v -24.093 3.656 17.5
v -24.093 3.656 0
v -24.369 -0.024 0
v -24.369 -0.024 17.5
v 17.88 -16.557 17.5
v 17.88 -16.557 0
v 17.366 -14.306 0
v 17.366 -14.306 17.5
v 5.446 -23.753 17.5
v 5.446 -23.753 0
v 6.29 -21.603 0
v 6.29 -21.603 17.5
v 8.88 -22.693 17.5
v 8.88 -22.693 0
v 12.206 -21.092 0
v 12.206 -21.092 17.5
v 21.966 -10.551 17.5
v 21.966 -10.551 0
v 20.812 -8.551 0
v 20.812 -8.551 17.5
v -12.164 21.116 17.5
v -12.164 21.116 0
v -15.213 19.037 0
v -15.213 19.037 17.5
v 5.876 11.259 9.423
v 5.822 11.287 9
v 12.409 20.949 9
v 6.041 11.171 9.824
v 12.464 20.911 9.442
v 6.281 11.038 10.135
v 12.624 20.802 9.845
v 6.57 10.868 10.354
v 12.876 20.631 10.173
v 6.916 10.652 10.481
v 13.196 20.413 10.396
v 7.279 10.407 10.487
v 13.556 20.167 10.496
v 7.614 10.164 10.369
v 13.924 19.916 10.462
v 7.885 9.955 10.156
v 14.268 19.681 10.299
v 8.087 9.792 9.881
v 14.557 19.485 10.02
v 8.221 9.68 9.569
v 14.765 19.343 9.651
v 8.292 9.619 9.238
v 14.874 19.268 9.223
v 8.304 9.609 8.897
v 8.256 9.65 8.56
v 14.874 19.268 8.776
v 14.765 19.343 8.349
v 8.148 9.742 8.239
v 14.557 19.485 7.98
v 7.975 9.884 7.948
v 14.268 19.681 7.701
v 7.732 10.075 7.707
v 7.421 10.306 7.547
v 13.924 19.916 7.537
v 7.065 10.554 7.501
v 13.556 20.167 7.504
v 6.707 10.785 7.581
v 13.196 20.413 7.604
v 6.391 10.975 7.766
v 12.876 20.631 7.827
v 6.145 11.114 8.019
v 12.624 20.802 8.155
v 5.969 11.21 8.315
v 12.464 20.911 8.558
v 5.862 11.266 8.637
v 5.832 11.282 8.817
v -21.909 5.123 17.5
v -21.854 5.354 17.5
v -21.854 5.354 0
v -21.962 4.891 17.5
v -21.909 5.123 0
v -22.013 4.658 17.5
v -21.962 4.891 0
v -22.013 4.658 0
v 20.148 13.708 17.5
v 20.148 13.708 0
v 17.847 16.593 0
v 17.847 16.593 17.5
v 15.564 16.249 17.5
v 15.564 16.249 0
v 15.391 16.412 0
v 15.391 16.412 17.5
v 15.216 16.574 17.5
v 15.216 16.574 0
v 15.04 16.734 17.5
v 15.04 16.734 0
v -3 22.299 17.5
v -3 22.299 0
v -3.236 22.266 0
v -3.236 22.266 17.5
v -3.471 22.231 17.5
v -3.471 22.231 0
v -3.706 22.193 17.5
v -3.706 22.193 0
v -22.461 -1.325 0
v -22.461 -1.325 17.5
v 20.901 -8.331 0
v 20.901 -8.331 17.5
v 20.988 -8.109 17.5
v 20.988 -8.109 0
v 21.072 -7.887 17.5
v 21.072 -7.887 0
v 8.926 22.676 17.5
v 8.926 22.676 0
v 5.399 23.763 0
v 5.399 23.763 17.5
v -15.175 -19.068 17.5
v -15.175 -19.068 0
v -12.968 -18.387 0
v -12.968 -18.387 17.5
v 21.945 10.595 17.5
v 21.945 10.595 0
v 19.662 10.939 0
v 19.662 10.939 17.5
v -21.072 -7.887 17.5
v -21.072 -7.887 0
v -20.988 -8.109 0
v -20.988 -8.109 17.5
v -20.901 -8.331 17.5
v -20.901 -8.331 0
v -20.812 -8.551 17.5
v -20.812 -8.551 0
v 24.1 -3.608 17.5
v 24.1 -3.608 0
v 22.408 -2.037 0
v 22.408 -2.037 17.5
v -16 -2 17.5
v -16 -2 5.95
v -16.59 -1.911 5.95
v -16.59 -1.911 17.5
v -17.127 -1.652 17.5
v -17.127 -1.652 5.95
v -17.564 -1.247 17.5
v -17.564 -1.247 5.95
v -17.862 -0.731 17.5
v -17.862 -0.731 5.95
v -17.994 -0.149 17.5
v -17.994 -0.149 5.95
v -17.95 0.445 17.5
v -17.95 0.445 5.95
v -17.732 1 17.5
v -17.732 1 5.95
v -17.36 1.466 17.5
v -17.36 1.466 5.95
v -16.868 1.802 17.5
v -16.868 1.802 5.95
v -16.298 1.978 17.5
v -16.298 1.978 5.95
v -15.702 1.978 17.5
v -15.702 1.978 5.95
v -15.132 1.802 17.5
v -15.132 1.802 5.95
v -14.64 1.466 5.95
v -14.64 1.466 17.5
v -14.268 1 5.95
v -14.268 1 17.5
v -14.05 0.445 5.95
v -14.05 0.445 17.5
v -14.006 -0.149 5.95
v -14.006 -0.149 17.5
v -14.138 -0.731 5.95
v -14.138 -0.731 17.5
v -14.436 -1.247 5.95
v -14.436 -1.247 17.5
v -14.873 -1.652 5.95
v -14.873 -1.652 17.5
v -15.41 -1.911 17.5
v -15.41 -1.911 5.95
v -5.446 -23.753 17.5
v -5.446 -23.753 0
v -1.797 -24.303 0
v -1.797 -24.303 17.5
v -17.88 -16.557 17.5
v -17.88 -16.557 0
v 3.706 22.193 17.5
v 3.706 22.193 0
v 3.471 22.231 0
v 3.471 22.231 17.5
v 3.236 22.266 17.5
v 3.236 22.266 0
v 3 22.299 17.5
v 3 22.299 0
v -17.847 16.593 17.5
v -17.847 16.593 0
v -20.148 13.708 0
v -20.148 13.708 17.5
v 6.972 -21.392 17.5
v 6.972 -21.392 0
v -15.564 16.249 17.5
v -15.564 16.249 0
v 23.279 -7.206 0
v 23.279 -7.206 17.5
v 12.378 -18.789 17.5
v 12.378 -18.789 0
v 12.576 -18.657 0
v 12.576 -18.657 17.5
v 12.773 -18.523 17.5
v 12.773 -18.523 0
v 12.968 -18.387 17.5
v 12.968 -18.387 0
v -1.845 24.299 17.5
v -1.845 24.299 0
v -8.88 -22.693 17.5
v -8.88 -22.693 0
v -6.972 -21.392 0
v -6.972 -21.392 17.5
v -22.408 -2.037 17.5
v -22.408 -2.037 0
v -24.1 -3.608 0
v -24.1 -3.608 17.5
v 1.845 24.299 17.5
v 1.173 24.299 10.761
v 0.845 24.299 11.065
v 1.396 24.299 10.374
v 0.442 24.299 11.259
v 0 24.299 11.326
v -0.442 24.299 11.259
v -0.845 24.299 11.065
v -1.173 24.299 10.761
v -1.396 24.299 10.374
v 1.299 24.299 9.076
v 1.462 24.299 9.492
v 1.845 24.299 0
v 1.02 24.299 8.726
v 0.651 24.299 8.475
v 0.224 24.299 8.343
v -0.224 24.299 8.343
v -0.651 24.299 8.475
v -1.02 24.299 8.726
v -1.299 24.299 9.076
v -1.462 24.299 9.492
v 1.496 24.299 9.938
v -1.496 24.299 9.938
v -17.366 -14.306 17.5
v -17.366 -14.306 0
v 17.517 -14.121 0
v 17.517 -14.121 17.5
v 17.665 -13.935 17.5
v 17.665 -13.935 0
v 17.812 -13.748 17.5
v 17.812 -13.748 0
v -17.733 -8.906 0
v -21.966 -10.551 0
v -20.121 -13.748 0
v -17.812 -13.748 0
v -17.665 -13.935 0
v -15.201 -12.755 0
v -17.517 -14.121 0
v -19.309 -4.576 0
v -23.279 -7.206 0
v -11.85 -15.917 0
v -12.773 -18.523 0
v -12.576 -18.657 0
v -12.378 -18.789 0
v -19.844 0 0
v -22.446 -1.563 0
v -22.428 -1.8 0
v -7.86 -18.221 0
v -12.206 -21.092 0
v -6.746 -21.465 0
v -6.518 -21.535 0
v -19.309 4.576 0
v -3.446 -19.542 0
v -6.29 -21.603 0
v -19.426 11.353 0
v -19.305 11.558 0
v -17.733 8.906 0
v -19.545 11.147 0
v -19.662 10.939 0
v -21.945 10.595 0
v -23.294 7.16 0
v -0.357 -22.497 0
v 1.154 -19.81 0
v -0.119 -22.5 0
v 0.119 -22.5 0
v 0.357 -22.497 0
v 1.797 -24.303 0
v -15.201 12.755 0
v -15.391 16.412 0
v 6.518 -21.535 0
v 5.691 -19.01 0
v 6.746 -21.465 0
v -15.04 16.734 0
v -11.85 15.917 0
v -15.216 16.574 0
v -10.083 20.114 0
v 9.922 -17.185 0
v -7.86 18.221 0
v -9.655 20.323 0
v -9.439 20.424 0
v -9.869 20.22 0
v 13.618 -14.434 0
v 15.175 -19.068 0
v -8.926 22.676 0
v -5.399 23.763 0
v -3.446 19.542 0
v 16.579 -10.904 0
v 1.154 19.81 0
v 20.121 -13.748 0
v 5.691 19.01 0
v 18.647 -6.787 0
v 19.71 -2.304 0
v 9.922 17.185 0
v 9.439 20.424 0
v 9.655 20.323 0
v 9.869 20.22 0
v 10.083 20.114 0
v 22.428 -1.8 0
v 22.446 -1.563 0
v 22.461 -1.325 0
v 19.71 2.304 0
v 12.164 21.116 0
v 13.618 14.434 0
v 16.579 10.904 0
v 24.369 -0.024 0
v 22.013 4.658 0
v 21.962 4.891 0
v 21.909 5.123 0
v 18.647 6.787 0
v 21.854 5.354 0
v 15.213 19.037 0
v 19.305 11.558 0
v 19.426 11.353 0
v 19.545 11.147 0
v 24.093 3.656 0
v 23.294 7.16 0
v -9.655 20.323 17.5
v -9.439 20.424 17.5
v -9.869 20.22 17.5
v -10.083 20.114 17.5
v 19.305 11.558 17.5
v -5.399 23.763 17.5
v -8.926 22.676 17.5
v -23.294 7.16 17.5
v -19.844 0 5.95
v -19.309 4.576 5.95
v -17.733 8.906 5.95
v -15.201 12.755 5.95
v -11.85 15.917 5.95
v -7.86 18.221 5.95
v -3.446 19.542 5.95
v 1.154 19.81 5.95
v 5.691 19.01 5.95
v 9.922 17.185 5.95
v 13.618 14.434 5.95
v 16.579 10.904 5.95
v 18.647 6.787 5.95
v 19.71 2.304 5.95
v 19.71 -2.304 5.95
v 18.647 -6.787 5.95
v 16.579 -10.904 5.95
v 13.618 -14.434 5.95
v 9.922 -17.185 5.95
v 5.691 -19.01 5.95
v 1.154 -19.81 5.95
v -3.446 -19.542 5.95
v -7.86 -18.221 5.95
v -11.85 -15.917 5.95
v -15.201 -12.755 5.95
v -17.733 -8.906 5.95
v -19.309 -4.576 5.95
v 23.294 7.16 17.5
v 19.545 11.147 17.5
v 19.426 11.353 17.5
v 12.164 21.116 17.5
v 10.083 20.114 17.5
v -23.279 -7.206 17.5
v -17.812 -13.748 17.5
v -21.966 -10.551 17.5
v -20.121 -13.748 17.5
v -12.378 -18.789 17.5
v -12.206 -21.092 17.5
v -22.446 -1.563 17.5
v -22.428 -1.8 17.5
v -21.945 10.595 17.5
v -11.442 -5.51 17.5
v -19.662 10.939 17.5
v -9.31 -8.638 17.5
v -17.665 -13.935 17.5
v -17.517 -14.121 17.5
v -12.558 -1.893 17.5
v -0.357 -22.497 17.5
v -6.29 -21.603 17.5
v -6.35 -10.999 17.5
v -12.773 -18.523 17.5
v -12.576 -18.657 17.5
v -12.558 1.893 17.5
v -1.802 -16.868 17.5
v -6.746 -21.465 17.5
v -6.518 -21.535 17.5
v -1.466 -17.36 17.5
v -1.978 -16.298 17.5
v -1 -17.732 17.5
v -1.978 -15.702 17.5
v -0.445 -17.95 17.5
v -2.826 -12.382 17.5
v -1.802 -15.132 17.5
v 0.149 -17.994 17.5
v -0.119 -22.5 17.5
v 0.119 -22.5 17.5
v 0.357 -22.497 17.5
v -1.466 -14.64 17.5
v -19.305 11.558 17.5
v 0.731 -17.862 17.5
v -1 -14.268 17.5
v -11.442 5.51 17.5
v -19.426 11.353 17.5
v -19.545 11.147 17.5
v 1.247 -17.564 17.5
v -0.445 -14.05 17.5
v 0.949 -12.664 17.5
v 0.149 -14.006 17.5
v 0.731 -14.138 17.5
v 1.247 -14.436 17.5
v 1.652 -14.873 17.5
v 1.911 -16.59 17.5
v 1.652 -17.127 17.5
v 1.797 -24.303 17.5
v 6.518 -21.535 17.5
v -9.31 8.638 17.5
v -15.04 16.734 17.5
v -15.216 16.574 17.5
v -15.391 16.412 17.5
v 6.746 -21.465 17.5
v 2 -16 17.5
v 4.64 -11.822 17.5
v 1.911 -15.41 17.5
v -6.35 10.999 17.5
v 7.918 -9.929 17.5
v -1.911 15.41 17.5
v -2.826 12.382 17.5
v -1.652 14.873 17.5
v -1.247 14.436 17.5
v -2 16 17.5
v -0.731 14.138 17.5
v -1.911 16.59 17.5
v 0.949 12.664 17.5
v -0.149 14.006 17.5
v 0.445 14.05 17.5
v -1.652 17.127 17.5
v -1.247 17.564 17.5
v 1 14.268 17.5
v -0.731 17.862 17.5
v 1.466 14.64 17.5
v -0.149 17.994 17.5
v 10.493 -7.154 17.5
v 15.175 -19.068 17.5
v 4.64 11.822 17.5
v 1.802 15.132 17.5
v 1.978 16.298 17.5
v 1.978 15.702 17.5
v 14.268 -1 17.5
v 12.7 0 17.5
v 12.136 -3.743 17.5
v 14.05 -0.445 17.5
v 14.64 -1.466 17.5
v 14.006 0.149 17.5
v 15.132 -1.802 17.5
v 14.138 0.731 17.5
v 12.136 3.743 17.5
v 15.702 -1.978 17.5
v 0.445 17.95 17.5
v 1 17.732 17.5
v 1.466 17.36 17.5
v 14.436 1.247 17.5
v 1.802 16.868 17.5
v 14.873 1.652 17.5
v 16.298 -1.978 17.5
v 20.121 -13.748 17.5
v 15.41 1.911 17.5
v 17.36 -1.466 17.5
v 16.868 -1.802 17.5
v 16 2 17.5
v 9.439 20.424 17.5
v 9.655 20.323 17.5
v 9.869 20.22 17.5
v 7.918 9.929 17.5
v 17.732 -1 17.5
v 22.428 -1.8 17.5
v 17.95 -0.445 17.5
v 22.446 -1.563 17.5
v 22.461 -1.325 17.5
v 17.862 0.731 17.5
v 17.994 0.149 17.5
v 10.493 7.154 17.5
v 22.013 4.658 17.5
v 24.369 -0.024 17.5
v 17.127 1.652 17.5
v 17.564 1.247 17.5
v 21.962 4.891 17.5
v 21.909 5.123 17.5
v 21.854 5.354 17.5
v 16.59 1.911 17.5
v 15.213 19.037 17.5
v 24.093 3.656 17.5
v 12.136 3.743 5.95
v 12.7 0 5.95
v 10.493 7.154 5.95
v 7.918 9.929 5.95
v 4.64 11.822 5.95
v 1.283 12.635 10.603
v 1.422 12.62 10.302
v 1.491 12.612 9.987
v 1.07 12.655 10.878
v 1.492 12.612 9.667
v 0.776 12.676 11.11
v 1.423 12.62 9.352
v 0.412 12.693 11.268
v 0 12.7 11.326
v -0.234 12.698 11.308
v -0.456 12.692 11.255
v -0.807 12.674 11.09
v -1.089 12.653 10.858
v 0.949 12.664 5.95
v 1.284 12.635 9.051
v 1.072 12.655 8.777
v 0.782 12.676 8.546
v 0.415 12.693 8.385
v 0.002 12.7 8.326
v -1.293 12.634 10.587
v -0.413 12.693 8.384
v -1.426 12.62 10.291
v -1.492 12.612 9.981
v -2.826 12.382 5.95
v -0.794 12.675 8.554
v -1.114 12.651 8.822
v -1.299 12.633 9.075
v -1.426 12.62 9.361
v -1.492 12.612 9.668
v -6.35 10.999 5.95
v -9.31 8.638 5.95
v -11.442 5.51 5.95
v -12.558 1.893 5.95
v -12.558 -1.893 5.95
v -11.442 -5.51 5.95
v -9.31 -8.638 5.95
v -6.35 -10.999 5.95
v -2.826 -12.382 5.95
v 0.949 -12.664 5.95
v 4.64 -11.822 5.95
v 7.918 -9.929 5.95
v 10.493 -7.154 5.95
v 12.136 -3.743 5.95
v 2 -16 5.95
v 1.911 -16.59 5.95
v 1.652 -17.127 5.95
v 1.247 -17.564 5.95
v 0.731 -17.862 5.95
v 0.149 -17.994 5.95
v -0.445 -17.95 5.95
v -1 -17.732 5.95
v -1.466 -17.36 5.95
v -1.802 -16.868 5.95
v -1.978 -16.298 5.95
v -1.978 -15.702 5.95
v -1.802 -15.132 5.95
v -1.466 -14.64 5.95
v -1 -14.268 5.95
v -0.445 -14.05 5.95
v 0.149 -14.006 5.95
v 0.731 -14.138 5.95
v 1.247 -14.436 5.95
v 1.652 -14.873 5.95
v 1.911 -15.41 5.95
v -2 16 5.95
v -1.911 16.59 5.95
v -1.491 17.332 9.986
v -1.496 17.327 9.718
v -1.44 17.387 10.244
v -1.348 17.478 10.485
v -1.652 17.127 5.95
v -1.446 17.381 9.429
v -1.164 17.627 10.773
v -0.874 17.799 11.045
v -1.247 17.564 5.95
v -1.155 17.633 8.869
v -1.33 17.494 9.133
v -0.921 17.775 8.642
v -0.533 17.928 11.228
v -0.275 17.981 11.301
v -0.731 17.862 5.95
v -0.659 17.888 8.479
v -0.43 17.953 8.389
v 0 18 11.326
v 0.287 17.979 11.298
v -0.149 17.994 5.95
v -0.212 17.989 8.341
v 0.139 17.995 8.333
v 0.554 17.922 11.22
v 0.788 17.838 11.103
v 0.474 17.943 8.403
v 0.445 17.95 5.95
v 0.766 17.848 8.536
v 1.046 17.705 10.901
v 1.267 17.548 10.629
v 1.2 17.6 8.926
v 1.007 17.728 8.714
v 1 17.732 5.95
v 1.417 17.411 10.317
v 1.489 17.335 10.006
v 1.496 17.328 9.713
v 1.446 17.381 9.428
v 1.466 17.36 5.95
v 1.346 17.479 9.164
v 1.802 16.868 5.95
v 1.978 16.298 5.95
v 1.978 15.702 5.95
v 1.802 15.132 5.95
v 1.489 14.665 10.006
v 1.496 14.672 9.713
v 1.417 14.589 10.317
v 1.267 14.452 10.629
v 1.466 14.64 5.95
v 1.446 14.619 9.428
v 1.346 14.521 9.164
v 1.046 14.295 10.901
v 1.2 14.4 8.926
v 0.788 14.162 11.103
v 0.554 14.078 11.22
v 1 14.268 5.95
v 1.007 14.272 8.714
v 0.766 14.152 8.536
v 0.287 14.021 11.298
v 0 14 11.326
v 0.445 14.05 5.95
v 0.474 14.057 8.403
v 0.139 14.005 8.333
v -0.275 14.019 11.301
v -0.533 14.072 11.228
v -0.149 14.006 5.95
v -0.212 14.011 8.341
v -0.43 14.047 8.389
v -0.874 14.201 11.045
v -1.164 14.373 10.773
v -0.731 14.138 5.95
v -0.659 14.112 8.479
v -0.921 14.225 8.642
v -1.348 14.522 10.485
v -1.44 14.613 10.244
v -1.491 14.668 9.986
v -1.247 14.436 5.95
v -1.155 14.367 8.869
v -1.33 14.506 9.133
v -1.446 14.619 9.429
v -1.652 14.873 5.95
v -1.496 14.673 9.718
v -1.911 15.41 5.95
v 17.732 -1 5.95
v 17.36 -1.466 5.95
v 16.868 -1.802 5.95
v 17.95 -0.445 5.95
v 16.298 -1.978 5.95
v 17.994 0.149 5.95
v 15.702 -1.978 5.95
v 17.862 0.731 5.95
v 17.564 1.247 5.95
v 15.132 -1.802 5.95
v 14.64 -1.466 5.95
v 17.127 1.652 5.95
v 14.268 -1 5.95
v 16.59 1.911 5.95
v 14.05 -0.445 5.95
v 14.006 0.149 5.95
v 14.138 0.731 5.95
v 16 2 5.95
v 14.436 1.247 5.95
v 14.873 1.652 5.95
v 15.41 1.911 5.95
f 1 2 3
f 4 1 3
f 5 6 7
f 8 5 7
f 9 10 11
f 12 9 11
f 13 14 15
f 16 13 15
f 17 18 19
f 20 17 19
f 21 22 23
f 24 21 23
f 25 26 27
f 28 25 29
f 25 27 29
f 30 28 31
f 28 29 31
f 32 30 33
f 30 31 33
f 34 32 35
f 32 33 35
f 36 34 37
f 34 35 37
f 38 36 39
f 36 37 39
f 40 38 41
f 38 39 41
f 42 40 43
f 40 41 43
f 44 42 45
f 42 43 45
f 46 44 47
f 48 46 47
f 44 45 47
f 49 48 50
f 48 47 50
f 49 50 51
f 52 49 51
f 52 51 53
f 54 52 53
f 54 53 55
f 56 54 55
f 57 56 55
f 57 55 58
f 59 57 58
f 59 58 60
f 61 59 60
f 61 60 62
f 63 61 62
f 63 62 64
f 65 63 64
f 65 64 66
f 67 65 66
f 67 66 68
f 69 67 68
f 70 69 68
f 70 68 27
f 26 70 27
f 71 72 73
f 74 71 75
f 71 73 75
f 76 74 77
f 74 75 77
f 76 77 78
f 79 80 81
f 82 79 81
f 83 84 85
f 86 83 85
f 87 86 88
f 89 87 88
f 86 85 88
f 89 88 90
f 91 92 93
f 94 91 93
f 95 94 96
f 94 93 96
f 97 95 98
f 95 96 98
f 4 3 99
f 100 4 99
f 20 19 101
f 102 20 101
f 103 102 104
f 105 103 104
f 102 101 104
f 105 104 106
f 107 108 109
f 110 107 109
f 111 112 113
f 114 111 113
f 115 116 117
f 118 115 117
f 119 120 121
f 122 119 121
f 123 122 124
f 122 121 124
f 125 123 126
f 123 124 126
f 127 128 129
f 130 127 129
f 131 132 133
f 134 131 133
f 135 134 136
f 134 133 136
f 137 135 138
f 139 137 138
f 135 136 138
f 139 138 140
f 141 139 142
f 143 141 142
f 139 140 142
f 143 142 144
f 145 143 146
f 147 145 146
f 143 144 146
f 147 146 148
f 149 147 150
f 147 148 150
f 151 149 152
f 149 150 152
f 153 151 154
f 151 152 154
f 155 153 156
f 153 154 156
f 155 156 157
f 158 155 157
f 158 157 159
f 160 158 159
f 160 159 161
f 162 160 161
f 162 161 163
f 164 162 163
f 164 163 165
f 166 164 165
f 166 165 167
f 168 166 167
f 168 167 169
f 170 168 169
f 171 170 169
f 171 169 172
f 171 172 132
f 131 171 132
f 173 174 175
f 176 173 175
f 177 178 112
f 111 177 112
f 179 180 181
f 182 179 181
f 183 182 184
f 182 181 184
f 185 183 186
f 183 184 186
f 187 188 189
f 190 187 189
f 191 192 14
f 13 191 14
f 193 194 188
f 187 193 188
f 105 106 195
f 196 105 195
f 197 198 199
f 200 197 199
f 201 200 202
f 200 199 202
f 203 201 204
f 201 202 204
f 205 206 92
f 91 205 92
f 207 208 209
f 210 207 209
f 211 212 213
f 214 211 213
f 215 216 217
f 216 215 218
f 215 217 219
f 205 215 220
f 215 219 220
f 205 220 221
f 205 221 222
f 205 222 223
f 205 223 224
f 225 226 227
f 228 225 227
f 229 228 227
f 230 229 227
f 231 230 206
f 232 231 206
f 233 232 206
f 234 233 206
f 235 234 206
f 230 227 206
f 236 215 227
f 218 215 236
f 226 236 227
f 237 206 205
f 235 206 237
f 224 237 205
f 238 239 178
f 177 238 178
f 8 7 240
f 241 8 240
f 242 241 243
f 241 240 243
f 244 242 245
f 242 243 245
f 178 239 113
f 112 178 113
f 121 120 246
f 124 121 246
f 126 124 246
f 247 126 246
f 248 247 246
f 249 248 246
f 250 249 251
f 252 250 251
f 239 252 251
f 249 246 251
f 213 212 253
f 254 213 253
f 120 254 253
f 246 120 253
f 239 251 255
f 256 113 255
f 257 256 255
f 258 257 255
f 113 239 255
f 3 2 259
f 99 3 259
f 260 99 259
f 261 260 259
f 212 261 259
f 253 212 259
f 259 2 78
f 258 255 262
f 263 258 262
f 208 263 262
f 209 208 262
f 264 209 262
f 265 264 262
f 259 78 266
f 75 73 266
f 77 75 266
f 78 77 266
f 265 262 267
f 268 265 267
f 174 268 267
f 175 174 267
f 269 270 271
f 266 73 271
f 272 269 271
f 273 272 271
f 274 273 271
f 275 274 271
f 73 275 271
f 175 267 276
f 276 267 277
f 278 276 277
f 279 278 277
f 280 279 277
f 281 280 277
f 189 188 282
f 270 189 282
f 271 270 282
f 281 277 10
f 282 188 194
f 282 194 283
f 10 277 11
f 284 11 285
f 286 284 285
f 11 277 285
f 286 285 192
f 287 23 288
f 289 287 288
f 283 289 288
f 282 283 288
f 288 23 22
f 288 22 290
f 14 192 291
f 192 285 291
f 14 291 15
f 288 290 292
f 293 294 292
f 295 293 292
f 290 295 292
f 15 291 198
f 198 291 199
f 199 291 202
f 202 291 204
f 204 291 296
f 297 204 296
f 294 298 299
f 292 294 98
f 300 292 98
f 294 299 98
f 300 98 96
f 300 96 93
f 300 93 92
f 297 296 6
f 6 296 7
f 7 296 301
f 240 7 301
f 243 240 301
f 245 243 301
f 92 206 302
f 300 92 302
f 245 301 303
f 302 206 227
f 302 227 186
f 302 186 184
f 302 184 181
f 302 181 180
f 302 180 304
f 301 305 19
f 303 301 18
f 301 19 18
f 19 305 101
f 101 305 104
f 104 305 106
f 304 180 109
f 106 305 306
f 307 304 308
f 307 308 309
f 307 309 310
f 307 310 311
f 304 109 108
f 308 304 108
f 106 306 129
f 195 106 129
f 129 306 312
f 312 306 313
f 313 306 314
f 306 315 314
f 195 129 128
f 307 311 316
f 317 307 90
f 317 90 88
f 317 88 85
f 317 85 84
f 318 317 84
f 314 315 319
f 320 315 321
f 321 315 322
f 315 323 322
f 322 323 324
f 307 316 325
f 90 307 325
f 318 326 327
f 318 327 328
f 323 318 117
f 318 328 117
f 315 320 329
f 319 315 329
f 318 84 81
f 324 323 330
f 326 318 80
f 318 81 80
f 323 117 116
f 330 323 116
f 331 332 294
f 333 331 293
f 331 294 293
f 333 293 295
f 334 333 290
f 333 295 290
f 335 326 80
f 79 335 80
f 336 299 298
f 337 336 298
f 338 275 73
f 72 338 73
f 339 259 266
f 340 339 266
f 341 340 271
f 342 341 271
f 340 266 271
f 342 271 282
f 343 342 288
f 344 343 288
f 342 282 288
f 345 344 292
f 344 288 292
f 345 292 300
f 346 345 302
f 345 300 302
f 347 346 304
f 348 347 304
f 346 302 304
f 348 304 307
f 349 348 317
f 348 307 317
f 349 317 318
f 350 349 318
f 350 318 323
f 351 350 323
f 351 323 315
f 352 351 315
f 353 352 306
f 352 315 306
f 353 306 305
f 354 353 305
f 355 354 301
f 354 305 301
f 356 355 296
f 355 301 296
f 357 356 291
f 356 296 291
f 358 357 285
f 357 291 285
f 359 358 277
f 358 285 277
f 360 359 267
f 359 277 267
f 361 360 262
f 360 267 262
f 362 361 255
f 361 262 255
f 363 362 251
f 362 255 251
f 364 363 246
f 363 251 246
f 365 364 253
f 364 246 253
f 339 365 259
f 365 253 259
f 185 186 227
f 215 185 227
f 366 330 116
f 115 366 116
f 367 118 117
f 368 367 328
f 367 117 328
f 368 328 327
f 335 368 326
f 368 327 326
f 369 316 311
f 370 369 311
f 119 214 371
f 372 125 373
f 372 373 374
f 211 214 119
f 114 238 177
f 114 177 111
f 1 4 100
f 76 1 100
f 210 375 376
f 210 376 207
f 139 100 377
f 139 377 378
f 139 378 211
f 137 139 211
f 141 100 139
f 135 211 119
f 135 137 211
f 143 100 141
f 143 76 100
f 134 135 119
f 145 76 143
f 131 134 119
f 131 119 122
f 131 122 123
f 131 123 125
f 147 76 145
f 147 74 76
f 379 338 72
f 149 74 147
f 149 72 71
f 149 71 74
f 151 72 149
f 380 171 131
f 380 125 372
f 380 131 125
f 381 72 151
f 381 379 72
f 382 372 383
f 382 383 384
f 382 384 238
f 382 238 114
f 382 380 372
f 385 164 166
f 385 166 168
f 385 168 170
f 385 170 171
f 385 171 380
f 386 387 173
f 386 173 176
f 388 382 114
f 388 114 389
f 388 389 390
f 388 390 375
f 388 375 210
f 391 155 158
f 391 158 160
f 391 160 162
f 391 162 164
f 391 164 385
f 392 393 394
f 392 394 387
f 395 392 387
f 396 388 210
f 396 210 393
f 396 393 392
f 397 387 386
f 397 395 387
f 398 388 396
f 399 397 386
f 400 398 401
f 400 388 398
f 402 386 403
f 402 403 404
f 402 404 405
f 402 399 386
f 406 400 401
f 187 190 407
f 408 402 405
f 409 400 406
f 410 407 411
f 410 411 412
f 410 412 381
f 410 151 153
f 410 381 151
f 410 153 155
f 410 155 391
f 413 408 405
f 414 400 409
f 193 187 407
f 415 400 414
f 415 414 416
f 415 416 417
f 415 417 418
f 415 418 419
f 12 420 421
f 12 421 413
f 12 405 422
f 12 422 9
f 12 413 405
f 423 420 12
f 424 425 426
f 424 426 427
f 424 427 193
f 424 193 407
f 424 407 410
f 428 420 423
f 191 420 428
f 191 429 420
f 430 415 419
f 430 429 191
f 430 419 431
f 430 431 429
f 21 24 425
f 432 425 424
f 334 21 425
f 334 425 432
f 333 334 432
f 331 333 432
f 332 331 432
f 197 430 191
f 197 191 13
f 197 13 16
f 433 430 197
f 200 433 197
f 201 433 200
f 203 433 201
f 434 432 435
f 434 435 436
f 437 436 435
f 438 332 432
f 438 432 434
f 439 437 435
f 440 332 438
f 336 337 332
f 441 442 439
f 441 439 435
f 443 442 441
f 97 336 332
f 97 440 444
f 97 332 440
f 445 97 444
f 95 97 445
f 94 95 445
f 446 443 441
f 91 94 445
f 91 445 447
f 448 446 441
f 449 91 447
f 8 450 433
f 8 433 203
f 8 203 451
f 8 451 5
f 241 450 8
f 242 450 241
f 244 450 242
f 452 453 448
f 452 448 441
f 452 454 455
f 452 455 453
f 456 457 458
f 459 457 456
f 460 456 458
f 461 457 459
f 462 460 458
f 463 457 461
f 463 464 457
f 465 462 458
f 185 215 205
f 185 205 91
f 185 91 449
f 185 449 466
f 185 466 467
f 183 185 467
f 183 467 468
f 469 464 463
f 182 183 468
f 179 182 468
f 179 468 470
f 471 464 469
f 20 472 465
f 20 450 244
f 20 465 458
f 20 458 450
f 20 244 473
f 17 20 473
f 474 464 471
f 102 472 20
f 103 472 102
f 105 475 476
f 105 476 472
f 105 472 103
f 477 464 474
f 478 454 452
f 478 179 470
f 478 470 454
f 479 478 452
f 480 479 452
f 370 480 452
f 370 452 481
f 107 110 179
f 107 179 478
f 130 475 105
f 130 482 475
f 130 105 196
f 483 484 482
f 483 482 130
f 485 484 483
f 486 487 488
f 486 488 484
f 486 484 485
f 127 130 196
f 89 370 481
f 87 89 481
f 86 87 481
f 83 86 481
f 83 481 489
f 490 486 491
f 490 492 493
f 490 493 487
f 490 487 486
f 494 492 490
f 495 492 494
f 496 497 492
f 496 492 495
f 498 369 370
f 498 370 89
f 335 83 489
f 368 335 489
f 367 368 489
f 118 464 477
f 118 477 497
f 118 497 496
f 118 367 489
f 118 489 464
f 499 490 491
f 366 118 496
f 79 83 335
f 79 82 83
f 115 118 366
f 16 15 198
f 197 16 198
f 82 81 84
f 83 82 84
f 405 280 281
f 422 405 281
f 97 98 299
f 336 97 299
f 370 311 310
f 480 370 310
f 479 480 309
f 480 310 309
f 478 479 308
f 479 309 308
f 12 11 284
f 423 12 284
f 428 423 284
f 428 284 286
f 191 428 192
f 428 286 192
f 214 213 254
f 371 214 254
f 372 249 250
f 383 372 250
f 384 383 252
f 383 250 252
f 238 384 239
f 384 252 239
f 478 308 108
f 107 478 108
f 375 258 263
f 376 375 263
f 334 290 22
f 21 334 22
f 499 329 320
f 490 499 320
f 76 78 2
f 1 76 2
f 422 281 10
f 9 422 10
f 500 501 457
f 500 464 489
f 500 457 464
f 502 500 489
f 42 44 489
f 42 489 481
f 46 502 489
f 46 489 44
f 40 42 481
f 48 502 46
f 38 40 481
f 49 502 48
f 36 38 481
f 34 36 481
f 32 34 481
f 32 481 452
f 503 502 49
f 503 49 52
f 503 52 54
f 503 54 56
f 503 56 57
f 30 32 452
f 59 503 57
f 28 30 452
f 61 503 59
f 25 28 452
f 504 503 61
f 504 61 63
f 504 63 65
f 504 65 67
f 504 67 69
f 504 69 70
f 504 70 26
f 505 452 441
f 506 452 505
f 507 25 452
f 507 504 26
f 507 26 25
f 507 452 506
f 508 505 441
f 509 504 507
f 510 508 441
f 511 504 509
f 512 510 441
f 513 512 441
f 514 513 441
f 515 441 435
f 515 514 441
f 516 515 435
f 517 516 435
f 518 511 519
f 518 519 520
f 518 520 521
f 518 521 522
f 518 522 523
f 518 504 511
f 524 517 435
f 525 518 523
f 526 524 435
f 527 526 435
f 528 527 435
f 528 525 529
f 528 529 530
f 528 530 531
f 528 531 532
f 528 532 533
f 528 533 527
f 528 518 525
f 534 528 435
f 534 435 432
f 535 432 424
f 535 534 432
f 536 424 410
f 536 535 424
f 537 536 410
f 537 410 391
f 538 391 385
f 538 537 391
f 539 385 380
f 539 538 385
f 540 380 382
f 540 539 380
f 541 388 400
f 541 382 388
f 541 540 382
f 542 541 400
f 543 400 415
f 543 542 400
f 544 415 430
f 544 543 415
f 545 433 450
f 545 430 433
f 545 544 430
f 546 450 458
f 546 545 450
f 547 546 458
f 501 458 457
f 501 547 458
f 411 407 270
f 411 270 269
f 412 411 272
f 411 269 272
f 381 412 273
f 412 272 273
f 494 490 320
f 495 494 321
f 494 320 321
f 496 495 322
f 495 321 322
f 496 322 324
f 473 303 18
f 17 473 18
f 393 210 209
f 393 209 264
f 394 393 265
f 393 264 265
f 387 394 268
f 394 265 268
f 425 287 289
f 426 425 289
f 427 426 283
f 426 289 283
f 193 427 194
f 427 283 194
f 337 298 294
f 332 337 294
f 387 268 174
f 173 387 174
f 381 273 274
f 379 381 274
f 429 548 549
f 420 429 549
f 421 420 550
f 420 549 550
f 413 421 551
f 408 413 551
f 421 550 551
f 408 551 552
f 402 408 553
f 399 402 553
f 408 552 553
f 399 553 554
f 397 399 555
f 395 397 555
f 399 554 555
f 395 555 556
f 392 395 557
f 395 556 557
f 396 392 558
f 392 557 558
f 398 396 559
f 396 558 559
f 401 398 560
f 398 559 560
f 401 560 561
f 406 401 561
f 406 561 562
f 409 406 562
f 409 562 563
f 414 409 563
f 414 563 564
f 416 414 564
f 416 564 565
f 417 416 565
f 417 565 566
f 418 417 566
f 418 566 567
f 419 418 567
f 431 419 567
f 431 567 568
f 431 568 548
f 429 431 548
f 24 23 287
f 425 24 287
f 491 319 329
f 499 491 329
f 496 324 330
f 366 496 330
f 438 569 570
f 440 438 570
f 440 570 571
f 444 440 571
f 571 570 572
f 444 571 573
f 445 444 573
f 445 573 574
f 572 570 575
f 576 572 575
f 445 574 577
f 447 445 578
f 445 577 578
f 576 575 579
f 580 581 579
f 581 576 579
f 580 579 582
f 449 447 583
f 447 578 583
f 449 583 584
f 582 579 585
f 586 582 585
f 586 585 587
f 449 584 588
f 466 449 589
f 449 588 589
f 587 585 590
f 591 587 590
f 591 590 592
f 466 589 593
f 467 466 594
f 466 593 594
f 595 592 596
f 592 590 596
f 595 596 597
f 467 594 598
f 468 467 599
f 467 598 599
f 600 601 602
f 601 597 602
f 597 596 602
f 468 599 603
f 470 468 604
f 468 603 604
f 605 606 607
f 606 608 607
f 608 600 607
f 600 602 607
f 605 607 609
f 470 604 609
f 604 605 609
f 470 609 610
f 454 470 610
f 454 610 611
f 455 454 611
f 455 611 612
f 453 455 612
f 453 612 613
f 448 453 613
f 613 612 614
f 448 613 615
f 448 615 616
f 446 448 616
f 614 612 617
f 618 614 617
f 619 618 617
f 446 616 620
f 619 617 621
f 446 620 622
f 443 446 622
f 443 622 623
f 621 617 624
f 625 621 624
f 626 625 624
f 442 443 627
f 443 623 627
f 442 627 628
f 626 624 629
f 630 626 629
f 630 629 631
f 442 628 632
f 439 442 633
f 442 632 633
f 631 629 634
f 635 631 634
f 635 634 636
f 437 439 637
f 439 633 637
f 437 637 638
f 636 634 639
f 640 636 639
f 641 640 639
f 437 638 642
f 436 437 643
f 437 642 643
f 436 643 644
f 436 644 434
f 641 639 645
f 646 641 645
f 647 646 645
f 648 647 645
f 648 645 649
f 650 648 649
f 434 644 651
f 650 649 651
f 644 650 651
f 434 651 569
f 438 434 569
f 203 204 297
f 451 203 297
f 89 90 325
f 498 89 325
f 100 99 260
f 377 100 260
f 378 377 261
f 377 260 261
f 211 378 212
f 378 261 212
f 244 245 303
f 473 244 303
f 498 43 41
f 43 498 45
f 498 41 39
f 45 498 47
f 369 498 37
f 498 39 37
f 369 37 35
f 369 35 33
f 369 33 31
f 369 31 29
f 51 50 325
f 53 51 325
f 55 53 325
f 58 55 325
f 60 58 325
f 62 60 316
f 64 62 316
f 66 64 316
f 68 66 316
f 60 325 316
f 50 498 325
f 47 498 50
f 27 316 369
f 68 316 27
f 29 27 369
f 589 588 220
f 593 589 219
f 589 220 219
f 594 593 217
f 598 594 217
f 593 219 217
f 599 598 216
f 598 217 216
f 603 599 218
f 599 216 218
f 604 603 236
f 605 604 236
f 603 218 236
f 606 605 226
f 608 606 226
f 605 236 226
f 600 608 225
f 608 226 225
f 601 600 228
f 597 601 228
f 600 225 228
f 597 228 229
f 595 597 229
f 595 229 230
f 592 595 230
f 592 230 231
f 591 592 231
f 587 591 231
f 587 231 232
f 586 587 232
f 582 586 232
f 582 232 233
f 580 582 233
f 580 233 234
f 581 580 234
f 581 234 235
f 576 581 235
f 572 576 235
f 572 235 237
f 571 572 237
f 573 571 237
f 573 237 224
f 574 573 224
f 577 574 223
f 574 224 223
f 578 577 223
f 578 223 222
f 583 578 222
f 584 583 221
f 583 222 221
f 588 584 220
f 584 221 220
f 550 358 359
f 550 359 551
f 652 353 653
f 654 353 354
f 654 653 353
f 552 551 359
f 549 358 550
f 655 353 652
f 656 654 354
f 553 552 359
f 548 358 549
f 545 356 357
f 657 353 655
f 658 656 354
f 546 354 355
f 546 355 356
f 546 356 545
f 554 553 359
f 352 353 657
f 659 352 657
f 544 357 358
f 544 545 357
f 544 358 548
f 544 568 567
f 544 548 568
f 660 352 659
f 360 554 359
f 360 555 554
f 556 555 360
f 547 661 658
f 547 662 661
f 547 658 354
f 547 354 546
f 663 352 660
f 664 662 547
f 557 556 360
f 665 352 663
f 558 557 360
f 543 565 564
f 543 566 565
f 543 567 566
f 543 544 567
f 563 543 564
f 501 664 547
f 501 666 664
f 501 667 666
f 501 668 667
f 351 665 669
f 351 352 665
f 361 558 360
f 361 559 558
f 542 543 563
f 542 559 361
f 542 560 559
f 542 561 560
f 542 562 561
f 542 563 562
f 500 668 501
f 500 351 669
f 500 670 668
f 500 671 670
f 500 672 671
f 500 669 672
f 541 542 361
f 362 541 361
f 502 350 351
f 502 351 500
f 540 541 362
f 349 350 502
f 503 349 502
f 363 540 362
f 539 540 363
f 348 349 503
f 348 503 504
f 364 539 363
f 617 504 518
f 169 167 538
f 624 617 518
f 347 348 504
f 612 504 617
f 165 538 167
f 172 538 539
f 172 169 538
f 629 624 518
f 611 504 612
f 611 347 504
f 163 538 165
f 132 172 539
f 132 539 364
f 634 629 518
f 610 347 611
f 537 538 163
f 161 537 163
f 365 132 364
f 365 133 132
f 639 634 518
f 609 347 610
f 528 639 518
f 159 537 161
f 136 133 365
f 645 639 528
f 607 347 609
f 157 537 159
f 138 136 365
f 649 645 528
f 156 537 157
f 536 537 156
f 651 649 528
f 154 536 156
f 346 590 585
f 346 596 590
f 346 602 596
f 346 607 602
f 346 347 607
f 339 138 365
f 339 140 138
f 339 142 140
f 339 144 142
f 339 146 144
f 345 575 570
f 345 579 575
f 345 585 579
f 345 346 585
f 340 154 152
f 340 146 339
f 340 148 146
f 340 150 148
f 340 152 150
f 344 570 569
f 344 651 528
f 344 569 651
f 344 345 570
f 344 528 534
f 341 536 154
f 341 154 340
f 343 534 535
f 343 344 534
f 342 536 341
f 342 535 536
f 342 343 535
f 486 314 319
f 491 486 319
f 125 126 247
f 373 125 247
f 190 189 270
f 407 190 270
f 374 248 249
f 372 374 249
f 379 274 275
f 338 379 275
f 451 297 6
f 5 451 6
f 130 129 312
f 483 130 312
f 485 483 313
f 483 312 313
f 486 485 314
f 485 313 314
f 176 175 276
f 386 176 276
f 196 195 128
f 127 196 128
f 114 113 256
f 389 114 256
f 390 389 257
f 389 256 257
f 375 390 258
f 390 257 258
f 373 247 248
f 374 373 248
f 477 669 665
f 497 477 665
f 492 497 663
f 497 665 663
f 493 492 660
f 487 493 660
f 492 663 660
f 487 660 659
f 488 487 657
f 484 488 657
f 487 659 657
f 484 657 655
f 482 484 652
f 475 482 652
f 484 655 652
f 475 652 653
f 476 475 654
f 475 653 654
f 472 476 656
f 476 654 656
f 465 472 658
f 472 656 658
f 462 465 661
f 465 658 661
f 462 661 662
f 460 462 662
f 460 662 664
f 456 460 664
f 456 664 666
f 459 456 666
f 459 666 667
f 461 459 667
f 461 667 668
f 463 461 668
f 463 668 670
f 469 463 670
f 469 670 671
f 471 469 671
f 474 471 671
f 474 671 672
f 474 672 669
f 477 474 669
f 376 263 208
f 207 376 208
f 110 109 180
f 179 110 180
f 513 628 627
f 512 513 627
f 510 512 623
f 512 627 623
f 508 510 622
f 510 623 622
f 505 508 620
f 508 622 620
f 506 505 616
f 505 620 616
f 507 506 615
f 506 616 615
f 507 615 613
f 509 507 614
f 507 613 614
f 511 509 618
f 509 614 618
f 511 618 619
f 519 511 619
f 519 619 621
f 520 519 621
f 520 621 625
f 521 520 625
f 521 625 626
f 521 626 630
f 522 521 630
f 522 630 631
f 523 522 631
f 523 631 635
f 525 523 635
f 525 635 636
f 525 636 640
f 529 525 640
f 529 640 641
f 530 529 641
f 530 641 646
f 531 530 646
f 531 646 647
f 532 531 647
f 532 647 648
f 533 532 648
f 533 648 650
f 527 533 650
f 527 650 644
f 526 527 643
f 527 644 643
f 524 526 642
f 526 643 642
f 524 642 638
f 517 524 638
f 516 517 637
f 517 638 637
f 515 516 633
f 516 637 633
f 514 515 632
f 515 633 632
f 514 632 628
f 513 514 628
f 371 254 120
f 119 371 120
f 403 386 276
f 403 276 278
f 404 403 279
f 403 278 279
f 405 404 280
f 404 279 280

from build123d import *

# Parameters (mm, degrees)
SKETCH1_R           = 12.7
BOSS_EXTRUDE1_DEPTH = 17.5
SKETCH2_R           = 1.75
CUT_EXTRUDE1_DEPTH  = 10
CIRPATTERN1_COUNT   = 4
CIRPATTERN7_COUNT   = 21
SKETCH5_R           = 19.84375
CUT_EXTRUDE5_DEPTH  = 5.95
SKETCH9_R           = 2
CUT_EXTRUDE11_DEPTH = 26
CIRPATTERN9_COUNT   = 4
SKETCH10_R          = 1.5
CUT_EXTRUDE12_DEPTH = 26
SKETCH11_R          = 1.5
CUT_EXTRUDE13_DEPTH = 30


with BuildPart() as part:
    # Sketch1 → Boss-Extrude1 (new body)
    with BuildSketch(Plane.XY):
        with BuildLine():
            Line((-1.845299462, 24.299103121), (-3, 22.299103121))
            ThreePointArc((-3, 22.299103121), (0, -22.5), (3, 22.299103121))
            Line((3, 22.299103121), (1.845299462, 24.299103121))
            Line((1.845299462, 24.299103121), (-1.845299462, 24.299103121))
        make_face()
        Circle(SKETCH1_R, mode=Mode.SUBTRACT)
    boss_extrude1 = extrude(amount=BOSS_EXTRUDE1_DEPTH)

    # Sketch2 → Cut-Extrude1 (cut)
    with BuildSketch(Plane.XY.offset(17.5)):
        with Locations((-11.6, 11.6)):
            Circle(SKETCH2_R)
    cut_extrude1 = extrude(amount=-CUT_EXTRUDE1_DEPTH, mode=Mode.SUBTRACT)

    # CirPattern1: Cut-Extrude1 ×4 about axis
    cirpattern1_axis = Axis((0, 0, 0), (0, 0, 1))
    for i in range(1, CIRPATTERN1_COUNT):
        add(cut_extrude1.rotate(cirpattern1_axis, i * 360 / CIRPATTERN1_COUNT), mode=Mode.SUBTRACT)

    # CirPattern7: Boss-Extrude1 ×21 about axis
    cirpattern7_axis = Axis((0, 0, 0), (0, 0, 1))
    for i in range(1, CIRPATTERN7_COUNT):
        add(boss_extrude1.rotate(cirpattern7_axis, i * 360 / CIRPATTERN7_COUNT))

    # Sketch5 → Cut-Extrude5 (cut)
    with BuildSketch(Plane(origin=(0, 0, 0), x_dir=(-1, 0, 0), z_dir=(0, 0, -1))):
        Circle(SKETCH5_R)
    extrude(amount=-CUT_EXTRUDE5_DEPTH, mode=Mode.SUBTRACT)

    # Sketch9 → Cut-Extrude11 (cut)
    with BuildSketch(Plane(origin=(0, 0, 5.95), x_dir=(-1, 0, 0), z_dir=(0, 0, -1))):
        with Locations((0, 16)):
            Circle(SKETCH9_R)
    cut_extrude11 = extrude(amount=-CUT_EXTRUDE11_DEPTH, mode=Mode.SUBTRACT)

    # CirPattern9: Cut-Extrude11 ×4 about axis
    cirpattern9_axis = Axis((0, 0, 0), (0, 0, 1))
    for i in range(1, CIRPATTERN9_COUNT):
        add(cut_extrude11.rotate(cirpattern9_axis, i * 360 / CIRPATTERN9_COUNT), mode=Mode.SUBTRACT)

    # Sketch10 → Cut-Extrude12 (cut)
    with BuildSketch(Plane(origin=(13.688172181, 20.07686118, 0), x_dir=(0.8262387743160019, -0.5633200580636119, 0), z_dir=(0.5633200580636117, 0.8262387743160018, 0))):
        with Locations(Location((-0.048095596, -8.999871489, 0), (0, 0, 180))):
            Circle(SKETCH10_R)
    extrude(amount=-CUT_EXTRUDE12_DEPTH, mode=Mode.SUBTRACT)

    # Sketch11 → Cut-Extrude13 (cut)
    with BuildSketch(Plane(origin=(0, 24.299103121, 0), x_dir=(1, 0, 0), z_dir=(0, 1, 0))):
        with Locations(Location((0, -9.826057875, 0), (0, 0, 270))):
            Circle(SKETCH11_R)
    extrude(amount=-CUT_EXTRUDE13_DEPTH, mode=Mode.SUBTRACT)


solid = part.part
